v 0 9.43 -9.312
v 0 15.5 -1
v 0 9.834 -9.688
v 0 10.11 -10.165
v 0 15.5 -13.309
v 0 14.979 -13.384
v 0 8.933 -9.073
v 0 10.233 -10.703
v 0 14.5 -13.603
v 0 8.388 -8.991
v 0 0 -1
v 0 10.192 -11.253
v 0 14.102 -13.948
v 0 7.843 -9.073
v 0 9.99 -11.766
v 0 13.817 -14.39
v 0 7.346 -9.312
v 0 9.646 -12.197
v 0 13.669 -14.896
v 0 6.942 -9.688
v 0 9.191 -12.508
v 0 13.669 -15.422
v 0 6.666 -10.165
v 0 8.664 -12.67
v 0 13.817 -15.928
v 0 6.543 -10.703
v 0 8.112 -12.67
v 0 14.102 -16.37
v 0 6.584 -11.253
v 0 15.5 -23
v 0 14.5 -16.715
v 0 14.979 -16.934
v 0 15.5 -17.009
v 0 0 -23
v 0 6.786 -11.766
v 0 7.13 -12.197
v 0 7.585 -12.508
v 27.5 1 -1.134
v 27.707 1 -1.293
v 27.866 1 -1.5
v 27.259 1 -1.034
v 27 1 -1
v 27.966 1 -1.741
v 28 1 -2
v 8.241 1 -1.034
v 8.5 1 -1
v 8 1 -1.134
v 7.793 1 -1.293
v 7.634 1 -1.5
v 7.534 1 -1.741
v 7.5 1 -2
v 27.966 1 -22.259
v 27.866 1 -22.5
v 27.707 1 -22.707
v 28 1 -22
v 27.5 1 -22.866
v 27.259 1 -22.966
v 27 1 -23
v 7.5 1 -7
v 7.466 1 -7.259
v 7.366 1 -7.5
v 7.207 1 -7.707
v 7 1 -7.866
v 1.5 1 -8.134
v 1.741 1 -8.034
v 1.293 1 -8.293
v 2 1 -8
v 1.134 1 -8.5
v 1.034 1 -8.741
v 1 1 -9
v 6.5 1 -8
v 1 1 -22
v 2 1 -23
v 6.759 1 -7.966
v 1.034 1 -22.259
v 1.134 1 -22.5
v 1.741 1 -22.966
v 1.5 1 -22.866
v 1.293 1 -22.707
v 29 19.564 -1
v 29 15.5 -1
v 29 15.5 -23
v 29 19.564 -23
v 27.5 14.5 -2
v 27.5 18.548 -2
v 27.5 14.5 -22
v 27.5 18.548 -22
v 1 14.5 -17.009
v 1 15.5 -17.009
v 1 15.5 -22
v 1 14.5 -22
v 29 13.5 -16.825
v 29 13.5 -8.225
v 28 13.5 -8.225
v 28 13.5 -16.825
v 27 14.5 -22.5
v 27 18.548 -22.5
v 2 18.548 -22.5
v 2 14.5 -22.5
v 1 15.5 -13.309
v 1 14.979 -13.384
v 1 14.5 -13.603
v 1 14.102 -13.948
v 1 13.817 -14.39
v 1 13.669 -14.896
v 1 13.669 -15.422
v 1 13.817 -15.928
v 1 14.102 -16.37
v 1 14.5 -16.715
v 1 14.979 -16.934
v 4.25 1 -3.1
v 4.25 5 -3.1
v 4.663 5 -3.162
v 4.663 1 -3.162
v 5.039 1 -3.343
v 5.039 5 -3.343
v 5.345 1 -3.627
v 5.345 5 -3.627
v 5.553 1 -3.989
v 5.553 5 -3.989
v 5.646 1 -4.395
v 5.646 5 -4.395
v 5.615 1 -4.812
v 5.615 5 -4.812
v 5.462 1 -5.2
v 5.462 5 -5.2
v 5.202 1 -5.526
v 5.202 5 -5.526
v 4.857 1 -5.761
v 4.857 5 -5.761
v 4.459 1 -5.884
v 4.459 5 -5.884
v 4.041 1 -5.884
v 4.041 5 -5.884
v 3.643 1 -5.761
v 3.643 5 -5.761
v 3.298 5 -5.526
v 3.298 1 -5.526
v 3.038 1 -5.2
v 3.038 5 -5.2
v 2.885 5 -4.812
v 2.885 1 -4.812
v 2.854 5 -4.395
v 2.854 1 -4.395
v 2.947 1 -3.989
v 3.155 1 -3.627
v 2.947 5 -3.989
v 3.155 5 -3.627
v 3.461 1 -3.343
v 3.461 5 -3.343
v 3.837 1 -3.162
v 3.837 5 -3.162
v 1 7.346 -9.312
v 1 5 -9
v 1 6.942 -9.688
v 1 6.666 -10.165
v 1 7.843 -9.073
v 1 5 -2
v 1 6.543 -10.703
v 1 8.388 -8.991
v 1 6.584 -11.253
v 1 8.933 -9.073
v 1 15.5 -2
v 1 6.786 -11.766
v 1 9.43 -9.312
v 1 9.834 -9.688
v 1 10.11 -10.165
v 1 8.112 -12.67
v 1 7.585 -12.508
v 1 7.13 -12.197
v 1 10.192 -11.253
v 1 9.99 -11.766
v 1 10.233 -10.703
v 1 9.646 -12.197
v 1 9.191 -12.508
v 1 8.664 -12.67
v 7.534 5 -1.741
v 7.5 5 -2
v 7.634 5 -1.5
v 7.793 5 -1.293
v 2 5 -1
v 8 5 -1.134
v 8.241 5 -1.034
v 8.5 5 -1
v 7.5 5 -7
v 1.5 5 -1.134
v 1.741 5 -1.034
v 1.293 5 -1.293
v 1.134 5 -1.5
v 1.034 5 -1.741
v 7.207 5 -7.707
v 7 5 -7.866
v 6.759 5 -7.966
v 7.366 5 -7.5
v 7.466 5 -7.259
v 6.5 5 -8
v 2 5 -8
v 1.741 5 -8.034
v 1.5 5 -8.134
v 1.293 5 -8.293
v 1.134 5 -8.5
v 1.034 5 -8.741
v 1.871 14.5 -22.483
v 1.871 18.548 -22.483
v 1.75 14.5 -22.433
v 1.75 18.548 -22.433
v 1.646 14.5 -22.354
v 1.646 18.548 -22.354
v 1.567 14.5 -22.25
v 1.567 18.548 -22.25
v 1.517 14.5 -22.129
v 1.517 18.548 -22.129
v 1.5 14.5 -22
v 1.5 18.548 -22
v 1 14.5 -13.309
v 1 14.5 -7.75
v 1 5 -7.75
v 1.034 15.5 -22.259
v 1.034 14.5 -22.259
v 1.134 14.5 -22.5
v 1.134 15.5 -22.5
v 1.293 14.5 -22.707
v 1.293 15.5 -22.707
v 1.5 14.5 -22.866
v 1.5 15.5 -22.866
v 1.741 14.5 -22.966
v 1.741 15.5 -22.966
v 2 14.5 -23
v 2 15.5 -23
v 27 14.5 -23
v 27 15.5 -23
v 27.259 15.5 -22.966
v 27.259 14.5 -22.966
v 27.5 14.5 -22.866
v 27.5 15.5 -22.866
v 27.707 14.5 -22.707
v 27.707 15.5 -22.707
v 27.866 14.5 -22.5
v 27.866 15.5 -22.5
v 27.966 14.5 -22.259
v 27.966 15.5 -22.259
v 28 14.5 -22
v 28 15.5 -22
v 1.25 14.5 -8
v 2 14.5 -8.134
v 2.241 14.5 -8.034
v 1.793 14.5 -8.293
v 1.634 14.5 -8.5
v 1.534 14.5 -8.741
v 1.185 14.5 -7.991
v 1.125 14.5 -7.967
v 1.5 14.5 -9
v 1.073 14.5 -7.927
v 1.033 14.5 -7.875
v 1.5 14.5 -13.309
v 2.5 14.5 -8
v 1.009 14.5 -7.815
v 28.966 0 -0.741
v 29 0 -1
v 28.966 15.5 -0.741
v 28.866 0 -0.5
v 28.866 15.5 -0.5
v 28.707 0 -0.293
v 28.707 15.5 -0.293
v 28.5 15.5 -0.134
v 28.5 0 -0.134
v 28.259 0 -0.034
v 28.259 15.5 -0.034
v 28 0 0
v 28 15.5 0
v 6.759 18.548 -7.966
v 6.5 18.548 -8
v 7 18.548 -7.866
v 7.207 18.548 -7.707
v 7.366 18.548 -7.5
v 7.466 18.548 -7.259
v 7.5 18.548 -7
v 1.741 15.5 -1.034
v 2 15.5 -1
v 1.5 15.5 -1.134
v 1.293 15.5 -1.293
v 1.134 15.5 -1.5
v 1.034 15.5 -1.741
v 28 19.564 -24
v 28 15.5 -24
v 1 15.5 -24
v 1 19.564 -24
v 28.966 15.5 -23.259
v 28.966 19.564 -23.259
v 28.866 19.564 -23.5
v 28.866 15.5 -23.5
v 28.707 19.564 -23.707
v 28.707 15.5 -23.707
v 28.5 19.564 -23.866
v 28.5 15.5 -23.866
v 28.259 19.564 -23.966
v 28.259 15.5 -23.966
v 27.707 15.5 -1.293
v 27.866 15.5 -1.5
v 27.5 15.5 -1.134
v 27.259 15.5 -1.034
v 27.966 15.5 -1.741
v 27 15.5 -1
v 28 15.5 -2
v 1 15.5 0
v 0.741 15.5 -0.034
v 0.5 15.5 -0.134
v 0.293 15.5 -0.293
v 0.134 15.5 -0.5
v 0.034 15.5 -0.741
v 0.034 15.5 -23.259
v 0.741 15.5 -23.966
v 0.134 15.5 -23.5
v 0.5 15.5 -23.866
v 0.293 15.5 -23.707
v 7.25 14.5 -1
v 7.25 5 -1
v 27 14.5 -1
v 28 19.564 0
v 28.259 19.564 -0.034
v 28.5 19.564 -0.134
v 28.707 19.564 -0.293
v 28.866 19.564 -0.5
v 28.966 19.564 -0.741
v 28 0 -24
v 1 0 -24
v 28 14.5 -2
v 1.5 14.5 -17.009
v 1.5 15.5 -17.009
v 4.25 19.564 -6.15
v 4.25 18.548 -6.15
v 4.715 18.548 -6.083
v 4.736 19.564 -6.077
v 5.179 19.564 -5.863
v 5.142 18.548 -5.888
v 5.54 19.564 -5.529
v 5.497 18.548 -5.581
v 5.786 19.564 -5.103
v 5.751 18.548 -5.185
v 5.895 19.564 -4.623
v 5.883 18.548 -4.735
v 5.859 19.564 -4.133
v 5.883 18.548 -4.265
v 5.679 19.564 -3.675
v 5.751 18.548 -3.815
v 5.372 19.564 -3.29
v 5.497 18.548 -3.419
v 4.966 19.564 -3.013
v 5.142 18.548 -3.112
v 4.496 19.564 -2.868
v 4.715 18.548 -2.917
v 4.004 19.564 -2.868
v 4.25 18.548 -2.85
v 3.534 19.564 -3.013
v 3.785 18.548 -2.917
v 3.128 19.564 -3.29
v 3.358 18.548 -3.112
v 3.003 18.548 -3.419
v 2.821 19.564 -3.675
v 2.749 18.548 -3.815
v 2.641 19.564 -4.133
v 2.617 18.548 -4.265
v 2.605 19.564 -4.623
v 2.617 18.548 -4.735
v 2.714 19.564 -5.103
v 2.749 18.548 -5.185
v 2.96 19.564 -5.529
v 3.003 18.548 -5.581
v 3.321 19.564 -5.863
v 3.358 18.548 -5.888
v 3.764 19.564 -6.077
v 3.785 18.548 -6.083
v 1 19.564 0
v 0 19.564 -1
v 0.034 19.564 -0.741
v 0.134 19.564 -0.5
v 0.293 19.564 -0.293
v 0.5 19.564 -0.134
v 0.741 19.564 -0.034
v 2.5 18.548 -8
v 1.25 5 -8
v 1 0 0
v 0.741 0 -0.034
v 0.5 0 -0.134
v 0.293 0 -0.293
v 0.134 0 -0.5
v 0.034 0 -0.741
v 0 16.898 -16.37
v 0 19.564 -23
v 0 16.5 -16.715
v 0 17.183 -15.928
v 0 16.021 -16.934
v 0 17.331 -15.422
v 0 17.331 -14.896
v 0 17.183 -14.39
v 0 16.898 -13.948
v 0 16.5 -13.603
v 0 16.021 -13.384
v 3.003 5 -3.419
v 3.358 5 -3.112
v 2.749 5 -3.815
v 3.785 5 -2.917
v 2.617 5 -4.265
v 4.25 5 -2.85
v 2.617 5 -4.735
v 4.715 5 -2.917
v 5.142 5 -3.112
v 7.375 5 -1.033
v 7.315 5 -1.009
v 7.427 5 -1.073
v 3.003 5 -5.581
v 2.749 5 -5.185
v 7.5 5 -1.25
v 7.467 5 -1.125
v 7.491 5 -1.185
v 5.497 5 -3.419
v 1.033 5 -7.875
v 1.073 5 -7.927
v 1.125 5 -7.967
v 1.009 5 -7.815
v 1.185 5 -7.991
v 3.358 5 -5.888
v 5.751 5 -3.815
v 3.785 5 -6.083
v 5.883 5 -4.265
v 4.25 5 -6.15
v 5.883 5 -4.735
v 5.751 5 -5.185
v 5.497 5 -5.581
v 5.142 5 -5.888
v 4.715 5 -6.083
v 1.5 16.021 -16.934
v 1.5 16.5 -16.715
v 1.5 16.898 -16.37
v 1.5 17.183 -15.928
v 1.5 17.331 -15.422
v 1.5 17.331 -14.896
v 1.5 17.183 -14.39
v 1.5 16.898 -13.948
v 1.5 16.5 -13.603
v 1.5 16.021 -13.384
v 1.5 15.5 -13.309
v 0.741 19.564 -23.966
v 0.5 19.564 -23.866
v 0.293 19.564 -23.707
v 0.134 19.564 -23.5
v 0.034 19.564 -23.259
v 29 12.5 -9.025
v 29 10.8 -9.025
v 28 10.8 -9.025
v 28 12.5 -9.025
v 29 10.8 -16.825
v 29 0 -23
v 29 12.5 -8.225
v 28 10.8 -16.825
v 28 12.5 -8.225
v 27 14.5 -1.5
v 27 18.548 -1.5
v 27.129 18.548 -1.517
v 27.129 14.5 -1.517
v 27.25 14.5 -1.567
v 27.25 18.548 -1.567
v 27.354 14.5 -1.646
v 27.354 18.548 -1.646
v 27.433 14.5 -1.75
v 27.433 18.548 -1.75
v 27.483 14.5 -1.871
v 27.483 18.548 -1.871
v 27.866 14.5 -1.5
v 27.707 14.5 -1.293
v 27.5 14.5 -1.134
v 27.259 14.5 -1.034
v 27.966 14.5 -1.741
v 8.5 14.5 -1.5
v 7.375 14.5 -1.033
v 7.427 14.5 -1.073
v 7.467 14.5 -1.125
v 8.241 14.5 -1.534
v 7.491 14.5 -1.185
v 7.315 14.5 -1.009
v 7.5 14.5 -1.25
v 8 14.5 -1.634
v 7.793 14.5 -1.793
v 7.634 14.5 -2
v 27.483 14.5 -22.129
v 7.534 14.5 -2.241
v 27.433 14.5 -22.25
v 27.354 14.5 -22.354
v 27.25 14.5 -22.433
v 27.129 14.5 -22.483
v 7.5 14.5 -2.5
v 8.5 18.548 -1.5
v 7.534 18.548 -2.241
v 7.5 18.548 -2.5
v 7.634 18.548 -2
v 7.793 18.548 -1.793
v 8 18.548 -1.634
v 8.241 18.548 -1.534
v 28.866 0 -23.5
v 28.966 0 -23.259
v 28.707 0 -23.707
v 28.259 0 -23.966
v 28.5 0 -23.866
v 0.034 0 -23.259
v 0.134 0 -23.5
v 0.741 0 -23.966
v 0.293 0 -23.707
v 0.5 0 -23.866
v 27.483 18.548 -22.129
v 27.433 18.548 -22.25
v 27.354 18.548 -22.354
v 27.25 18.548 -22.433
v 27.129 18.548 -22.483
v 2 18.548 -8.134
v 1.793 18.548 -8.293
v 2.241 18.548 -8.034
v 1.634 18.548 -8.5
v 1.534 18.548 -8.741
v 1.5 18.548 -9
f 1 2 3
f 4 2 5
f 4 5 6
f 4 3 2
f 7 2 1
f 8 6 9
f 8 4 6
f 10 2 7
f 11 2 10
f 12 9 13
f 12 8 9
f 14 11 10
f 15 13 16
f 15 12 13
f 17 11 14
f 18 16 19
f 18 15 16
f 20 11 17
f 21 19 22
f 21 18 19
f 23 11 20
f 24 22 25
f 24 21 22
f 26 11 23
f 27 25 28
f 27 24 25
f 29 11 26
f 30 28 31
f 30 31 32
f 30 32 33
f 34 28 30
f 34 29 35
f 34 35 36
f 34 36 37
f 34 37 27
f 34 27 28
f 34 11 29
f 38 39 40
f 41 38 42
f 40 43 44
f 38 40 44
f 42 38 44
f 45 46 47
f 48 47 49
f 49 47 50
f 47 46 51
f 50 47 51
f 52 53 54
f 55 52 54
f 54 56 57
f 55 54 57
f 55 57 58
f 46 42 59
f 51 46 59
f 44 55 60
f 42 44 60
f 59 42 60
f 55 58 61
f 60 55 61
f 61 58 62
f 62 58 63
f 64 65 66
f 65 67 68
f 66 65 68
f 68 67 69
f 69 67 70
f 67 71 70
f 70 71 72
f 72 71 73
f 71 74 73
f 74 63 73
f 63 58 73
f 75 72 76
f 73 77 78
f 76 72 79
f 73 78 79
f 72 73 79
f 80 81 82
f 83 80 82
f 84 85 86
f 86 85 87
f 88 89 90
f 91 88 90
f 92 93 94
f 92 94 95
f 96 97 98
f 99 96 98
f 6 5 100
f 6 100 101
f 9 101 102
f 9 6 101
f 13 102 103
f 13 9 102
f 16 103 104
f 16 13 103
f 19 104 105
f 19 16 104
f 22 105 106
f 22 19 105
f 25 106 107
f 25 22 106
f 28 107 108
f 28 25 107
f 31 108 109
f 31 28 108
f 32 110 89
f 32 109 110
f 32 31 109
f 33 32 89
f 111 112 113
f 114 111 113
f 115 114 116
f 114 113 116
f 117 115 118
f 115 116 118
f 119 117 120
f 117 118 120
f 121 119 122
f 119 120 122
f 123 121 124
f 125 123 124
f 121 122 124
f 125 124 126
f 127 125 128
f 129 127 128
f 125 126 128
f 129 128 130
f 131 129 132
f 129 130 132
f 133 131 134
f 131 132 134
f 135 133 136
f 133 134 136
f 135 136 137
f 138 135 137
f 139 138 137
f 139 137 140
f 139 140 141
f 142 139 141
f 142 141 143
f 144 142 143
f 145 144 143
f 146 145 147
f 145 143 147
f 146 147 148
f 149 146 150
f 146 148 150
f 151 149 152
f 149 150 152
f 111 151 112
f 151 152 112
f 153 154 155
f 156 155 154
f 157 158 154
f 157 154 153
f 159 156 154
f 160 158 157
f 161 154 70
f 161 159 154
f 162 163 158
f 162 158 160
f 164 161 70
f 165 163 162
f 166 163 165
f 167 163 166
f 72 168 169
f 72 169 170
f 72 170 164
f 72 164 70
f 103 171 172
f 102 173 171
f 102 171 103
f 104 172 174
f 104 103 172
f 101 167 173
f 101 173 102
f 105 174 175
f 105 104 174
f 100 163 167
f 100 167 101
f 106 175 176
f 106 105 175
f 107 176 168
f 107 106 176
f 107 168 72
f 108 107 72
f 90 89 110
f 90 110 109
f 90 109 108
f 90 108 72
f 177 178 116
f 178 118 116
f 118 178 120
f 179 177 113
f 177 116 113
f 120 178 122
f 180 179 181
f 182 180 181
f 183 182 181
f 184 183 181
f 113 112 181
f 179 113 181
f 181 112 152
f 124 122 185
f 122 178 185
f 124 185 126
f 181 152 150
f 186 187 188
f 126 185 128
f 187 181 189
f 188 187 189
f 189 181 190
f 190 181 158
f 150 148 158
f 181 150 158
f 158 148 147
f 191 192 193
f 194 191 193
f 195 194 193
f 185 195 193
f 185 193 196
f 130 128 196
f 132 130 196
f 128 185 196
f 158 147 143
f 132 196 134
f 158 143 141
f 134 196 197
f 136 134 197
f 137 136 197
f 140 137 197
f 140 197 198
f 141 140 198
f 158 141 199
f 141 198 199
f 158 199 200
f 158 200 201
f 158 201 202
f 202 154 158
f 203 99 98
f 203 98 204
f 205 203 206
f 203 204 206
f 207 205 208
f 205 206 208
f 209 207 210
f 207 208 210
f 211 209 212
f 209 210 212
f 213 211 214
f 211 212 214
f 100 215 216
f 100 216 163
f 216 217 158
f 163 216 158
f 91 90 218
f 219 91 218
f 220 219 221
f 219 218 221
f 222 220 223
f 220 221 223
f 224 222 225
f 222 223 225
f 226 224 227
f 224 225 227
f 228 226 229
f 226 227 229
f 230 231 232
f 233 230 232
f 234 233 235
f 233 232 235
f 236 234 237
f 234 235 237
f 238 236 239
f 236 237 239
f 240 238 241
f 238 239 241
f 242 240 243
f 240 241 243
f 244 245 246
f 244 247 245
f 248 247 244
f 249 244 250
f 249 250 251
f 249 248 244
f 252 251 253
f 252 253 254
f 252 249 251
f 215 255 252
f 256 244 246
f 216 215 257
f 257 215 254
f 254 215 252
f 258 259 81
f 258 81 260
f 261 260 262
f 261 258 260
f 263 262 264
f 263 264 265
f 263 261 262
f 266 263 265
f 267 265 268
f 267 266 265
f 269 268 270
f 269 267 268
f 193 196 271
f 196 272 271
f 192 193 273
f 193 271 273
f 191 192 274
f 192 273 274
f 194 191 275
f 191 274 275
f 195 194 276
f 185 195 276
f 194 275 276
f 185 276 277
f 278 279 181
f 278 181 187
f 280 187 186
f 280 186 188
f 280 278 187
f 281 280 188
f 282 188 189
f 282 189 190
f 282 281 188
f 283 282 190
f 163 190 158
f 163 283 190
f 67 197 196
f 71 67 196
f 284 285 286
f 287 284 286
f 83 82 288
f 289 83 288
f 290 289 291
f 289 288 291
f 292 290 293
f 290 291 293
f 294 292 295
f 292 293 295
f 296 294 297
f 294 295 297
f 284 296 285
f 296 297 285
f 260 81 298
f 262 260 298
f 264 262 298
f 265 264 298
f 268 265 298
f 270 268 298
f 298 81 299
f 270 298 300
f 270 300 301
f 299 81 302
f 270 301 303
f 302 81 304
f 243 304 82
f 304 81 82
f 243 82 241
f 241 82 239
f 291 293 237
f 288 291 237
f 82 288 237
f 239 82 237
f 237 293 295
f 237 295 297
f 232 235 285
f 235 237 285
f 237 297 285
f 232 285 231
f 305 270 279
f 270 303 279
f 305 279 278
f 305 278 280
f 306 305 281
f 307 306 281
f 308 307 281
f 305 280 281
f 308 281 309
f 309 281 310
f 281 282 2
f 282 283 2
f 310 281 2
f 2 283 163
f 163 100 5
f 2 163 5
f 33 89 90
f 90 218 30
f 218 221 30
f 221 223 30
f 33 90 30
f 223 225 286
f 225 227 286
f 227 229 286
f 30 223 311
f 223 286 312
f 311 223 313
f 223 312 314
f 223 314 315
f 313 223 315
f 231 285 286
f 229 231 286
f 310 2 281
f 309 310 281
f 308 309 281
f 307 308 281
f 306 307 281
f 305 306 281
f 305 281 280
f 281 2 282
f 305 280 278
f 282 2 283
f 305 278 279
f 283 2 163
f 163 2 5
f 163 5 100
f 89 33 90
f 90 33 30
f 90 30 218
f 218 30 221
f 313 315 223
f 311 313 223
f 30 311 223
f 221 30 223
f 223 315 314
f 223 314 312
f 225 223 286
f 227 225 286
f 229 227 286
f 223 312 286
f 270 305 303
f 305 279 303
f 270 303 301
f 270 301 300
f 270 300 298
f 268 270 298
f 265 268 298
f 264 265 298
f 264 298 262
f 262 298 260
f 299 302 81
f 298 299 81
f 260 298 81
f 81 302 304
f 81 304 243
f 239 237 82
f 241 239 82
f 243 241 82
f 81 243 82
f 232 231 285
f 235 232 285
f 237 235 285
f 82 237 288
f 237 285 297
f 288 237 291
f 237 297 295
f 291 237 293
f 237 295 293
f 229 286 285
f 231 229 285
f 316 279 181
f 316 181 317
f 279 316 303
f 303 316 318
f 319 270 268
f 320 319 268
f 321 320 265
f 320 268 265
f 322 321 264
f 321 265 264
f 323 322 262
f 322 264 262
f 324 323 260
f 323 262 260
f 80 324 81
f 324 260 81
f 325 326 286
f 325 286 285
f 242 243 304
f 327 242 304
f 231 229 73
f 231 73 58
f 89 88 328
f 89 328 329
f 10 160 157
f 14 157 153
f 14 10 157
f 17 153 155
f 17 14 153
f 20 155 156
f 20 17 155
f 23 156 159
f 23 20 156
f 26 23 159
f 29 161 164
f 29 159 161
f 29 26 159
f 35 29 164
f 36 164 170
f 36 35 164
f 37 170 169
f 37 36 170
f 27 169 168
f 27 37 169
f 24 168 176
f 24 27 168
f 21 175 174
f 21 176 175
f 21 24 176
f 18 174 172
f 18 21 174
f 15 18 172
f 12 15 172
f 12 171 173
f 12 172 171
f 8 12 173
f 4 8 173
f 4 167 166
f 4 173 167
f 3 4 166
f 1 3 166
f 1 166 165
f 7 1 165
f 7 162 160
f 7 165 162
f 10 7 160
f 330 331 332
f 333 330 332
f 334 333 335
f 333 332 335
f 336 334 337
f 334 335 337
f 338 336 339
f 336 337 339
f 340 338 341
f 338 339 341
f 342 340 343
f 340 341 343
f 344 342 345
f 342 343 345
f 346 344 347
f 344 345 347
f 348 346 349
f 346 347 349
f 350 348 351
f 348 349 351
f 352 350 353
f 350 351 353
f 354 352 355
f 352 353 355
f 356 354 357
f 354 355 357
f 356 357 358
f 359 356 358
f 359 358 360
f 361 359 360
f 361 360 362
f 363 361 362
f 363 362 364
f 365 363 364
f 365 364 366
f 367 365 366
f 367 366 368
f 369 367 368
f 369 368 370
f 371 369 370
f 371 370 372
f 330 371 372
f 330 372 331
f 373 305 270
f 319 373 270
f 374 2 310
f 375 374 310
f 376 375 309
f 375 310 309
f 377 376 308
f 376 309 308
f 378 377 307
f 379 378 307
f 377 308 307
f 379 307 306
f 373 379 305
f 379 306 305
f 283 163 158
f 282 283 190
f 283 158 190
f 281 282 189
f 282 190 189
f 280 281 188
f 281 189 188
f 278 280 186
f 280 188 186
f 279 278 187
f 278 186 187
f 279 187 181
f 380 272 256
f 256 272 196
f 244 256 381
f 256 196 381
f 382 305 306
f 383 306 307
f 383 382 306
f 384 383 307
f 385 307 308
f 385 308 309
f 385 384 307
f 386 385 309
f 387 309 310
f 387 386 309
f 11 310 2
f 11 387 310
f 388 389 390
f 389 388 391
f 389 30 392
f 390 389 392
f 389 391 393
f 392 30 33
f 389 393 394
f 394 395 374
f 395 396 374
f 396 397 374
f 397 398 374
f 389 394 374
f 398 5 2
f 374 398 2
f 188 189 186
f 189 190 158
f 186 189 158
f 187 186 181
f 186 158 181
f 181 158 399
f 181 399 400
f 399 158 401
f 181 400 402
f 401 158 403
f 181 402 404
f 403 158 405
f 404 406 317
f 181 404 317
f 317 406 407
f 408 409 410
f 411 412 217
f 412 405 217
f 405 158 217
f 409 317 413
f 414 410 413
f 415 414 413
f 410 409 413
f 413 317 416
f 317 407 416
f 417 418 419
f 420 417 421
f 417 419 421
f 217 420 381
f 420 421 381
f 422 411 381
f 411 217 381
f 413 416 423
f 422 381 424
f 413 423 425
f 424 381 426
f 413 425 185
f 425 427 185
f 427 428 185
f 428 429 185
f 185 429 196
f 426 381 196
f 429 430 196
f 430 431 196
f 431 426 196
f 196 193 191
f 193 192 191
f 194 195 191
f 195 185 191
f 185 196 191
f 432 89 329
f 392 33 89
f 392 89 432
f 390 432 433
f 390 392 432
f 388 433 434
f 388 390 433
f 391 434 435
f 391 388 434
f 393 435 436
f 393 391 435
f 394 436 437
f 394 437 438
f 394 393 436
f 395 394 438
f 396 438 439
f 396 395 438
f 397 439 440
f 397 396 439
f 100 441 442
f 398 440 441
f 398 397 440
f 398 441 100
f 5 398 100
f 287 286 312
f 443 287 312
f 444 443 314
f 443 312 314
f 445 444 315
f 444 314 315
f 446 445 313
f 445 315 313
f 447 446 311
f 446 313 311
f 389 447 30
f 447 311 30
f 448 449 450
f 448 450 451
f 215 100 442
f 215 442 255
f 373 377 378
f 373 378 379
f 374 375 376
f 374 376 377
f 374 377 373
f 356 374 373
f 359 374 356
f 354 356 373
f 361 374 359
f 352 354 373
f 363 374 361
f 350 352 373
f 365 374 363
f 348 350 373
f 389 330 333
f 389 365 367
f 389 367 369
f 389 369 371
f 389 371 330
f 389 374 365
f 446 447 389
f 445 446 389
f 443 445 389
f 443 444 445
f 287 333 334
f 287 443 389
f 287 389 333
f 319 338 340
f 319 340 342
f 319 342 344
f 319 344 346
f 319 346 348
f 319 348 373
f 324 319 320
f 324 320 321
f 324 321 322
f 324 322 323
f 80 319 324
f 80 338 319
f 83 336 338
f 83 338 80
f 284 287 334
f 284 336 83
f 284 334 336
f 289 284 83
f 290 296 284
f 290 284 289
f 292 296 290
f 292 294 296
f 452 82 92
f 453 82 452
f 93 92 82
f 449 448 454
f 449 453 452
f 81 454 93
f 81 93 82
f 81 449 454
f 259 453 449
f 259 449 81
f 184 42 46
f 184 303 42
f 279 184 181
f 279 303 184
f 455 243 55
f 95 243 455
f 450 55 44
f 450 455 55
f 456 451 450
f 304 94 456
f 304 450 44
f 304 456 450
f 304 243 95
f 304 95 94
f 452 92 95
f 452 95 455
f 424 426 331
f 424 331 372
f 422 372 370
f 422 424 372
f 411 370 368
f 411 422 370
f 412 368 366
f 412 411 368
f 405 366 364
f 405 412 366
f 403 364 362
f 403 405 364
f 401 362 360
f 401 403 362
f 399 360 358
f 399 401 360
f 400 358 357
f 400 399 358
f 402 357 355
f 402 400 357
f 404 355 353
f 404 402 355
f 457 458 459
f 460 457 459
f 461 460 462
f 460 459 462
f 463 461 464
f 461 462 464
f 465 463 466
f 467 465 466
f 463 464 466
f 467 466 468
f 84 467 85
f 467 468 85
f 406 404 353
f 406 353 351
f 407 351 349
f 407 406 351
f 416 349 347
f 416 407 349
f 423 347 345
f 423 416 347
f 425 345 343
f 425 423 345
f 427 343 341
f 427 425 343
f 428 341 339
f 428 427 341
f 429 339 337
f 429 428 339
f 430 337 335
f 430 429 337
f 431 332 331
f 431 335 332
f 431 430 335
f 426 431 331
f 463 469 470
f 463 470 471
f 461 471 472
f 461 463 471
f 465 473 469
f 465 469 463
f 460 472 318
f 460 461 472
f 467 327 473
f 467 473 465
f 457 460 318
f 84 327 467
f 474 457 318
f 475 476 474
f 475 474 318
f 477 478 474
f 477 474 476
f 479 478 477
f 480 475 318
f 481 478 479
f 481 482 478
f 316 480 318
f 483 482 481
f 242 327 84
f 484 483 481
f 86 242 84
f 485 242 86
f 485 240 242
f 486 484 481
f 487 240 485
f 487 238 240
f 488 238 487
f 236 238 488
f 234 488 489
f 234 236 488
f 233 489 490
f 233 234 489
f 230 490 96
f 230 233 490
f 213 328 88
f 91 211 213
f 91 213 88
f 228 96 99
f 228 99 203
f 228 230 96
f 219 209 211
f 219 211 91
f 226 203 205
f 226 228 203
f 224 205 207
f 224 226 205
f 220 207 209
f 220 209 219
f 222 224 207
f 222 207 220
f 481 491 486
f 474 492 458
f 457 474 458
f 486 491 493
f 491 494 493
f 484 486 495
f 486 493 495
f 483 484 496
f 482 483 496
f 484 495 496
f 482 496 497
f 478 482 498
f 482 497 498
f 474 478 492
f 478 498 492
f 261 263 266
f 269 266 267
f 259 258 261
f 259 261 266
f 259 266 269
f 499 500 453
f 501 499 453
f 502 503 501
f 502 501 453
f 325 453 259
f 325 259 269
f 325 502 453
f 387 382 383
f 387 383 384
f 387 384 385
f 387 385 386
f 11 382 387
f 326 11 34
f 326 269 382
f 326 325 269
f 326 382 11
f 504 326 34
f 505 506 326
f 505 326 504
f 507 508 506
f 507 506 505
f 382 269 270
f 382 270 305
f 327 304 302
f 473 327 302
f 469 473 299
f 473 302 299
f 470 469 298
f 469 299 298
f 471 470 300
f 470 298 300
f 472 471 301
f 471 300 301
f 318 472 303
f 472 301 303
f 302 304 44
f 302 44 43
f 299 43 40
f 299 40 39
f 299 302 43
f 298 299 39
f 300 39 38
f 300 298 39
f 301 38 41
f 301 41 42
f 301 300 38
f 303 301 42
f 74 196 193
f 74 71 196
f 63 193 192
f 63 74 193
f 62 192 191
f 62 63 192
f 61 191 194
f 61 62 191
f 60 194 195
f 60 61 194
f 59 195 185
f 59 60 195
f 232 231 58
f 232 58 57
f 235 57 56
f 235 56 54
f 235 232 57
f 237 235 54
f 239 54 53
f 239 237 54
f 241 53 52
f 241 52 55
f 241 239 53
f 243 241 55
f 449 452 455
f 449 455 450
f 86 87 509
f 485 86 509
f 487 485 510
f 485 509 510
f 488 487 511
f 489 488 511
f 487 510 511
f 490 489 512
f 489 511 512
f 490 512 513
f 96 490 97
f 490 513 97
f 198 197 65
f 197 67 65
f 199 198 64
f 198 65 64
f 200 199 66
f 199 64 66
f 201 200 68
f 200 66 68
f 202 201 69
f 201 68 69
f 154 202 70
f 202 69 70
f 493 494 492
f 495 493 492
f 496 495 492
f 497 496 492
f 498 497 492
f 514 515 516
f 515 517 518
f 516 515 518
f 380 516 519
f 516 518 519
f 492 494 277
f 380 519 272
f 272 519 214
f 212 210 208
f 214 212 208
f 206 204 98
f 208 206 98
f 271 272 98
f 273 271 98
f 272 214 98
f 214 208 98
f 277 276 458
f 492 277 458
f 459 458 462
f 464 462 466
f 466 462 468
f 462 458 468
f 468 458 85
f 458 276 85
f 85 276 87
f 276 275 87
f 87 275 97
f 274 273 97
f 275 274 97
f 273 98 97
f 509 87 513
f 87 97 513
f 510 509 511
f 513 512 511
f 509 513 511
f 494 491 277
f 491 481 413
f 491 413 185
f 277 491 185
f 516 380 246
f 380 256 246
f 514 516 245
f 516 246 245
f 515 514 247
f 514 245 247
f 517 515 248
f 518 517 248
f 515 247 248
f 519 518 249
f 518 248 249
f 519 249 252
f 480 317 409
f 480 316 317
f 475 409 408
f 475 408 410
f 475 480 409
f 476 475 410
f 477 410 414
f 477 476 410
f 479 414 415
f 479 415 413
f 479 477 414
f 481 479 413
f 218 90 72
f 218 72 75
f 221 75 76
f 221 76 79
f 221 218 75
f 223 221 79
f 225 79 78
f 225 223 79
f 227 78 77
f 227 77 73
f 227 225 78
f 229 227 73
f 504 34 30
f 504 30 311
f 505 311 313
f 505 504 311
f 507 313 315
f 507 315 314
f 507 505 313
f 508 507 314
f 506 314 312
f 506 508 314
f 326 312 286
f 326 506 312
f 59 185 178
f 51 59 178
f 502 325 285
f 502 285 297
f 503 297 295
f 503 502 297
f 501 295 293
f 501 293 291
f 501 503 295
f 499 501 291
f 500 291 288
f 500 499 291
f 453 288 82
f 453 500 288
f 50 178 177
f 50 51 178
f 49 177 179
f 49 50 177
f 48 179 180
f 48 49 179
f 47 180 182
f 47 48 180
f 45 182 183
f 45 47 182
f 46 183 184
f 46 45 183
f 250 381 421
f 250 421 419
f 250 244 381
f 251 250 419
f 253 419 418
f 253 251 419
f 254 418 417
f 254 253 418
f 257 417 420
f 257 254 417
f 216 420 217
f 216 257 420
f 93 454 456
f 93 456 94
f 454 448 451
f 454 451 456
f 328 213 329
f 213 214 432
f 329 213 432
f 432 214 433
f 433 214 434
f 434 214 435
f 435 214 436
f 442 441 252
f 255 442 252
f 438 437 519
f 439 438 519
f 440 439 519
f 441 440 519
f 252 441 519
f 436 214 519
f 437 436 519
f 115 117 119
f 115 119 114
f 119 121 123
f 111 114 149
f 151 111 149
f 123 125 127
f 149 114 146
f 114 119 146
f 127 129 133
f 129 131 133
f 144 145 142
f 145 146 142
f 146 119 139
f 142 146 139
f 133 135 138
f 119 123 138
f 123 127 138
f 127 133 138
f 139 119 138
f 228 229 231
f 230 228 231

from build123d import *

# Parameters (mm, degrees)
BOSS_EXTRUDE1_DEPTH = 15.5
CUT_EXTRUDE1_DEPTH  = 14.5
CUT_EXTRUDE3_REACH  = 42.709
BOSS_EXTRUDE2_DEPTH = 4.064
CUT_EXTRUDE4_DEPTH  = 3.048
BOSS_EXTRUDE3_DEPTH = 1
SKETCH3_R           = 1.85
CUT_EXTRUDE2_DEPTH  = 1.5
CUT_EXTRUDE5_START  = 1
CUT_EXTRUDE5_DEPTH  = 0.5
BOSS_EXTRUDE4_START = 4
SKETCH6_R           = 1.4
BOSS_EXTRUDE4_DEPTH = 4
FILLET1_R           = 1
BOSS_EXTRUDE5_REACH = 42.362
SKETCH7_R           = 1.65
SKETCH8_R           = 1.65
CUT_EXTRUDE6_DEPTH  = 41.362236013
FILLET2_R           = 1
FILLET3_R           = 0.25


with BuildPart() as part:
    # Sketch1 → Boss-Extrude1 (new body)
    # profile 1 of 2: a face of its own
    with BuildSketch(Plane(origin=(0, 0, 0), x_dir=(1, 0, 0), z_dir=(0, 1, 0))):
        with BuildLine():
            ThreePointArc((1, 0), (0.292893219, 0.292893219), (0, 1))
            Line((0, 1), (0, 23))
            ThreePointArc((0, 23), (0.292893219, 23.707106781), (1, 24))
            Line((1, 24), (28, 24))
            ThreePointArc((28, 24), (28.707106781, 23.707106781), (29, 23))
            Line((29, 23), (29, 1))
            ThreePointArc((29, 1), (28.707106781, 0.292893219), (28, 0))
            Line((28, 0), (1, 0))
        make_face()
        with BuildLine():
            ThreePointArc((1, 2), (1.292893219, 1.292893219), (2, 1))
            Line((2, 1), (27, 1))
            ThreePointArc((27, 1), (27.707106781, 1.292893219), (28, 2))
            Line((28, 2), (28, 22))
            ThreePointArc((28, 22), (27.707106781, 22.707106781), (27, 23))
            Line((27, 23), (2, 23))
            ThreePointArc((2, 23), (1.292893219, 22.707106781), (1, 22))
            Line((1, 22), (1, 2))
        make_face(mode=Mode.SUBTRACT)
    # profile 2 of 2: a face of its own
    with BuildSketch(Plane(origin=(0, 0, 0), x_dir=(1, 0, 0), z_dir=(0, 1, 0))):
        with BuildLine():
            Line((1, 2), (1, 22))
            ThreePointArc((1, 22), (1.292893219, 22.707106781), (2, 23))
            Line((2, 23), (27, 23))
            ThreePointArc((27, 23), (27.707106781, 22.707106781), (28, 22))
            Line((28, 22), (28, 2))
            ThreePointArc((28, 2), (27.707106781, 1.292893219), (27, 1))
            Line((27, 1), (2, 1))
            ThreePointArc((2, 1), (1.292893219, 1.292893219), (1, 2))
        make_face()
    extrude(amount=BOSS_EXTRUDE1_DEPTH)

    # Sketch2 → Cut-Extrude1 (cut)
    with BuildSketch(Plane(origin=(0, 15.5, 0), x_dir=(1, 0, 0), z_dir=(0, 1, 0))):
        with BuildLine():
            Line((1, 2), (1, 22))
            ThreePointArc((1, 22), (1.292893219, 22.707106781), (2, 23))
            Line((2, 23), (27, 23))
            ThreePointArc((27, 23), (27.707106781, 22.707106781), (28, 22))
            Line((28, 22), (28, 2))
            ThreePointArc((28, 2), (27.707106781, 1.292893219), (27, 1))
            Line((27, 1), (2, 1))
            ThreePointArc((2, 1), (1.292893219, 1.292893219), (1, 2))
        make_face()
    extrude(amount=-CUT_EXTRUDE1_DEPTH, mode=Mode.SUBTRACT)

    # Sketch4 → Cut-Extrude3 (cut, up to next)
    with BuildSketch(Plane(origin=(29, 0, 0), x_dir=(0, 0, -1), z_dir=(1, 0, 0)), mode=Mode.PRIVATE) as cut_extrude3_sk1:
        Polygon((8.225, 13.5), (16.825, 13.5), (16.825, 10.8), (9.025, 10.8), (9.025, 12.5), (8.225, 12.5), align=None)
    cut_extrude3_tool1 = extrude(cut_extrude3_sk1.sketch, amount=-CUT_EXTRUDE3_REACH, mode=Mode.PRIVATE) & part.part
    add(cut_extrude3_tool1.solids().sort_by_distance((29, 12.181107, -12.767635))[0], mode=Mode.SUBTRACT)


with BuildPart() as body_2:
    # Sketch5 → Boss-Extrude2 (new body)
    # profile 1 of 4: a face of its own
    with BuildSketch(Plane(origin=(0, 15.5, 0), x_dir=(1, 0, 0), z_dir=(0, 1, 0))):
        with BuildLine():
            Line((0, 23), (0, 1))
            ThreePointArc((0, 1), (0.292893219, 0.292893219), (1, 0))
            Line((1, 0), (28, 0))
            ThreePointArc((28, 0), (28.707106781, 0.292893219), (29, 1))
            Line((29, 1), (29, 23))
            ThreePointArc((29, 23), (28.707106781, 23.707106781), (28, 24))
            Line((28, 24), (1, 24))
            ThreePointArc((1, 24), (0.292893219, 23.707106781), (0, 23))
        make_face()
        with BuildLine():
            Line((27, 1), (2, 1))
            ThreePointArc((2, 1), (1.292893219, 1.292893219), (1, 2))
            Line((1, 2), (1, 22))
            ThreePointArc((1, 22), (1.292893219, 22.707106781), (2, 23))
            Line((2, 23), (27, 23))
            ThreePointArc((27, 23), (27.707106781, 22.707106781), (28, 22))
            Line((28, 22), (28, 2))
            ThreePointArc((28, 2), (27.707106781, 1.292893219), (27, 1))
        make_face(mode=Mode.SUBTRACT)
    # profile 2 of 4: a face of its own
    with BuildSketch(Plane(origin=(0, 15.5, 0), x_dir=(1, 0, 0), z_dir=(0, 1, 0))):
        with BuildLine():
            ThreePointArc((2, 1), (1.292893219, 1.292893219), (1, 2))
            Line((1, 2), (1, 22))
            ThreePointArc((1, 22), (1.292893219, 22.707106781), (2, 23))
            Line((2, 23), (27, 23))
            ThreePointArc((27, 23), (27.707106781, 22.707106781), (28, 22))
            Line((28, 22), (28, 2))
            ThreePointArc((28, 2), (27.707106781, 1.292893219), (27, 1))
            Line((27, 1), (2, 1))
        make_face()
        with BuildLine():
            ThreePointArc((2, 22.5), (1.646446609, 22.353553391), (1.5, 22))
            Line((1.5, 22), (1.5, 2))
            ThreePointArc((1.5, 2), (1.646446609, 1.646446609), (2, 1.5))
            Line((2, 1.5), (27, 1.5))
            ThreePointArc((27, 1.5), (27.353553391, 1.646446609), (27.5, 2))
            Line((27.5, 2), (27.5, 22))
            ThreePointArc((27.5, 22), (27.353553391, 22.353553391), (27, 22.5))
            Line((27, 22.5), (2, 22.5))
        make_face(mode=Mode.SUBTRACT)
    # profile 3 of 4: a face of its own
    with BuildSketch(Plane(origin=(0, 15.5, 0), x_dir=(1, 0, 0), z_dir=(0, 1, 0))):
        with BuildLine():
            Line((27, 22.5), (2, 22.5))
            ThreePointArc((2, 22.5), (1.646446609, 22.353553391), (1.5, 22))
            Line((1.5, 22), (1.5, 2))
            ThreePointArc((1.5, 2), (1.646446609, 1.646446609), (2, 1.5))
            Line((2, 1.5), (27, 1.5))
            ThreePointArc((27, 1.5), (27.353553391, 1.646446609), (27.5, 2))
            Line((27.5, 2), (27.5, 22))
            ThreePointArc((27.5, 22), (27.353553391, 22.353553391), (27, 22.5))
        make_face()
    # profile 4 of 4: a face of its own
    with BuildSketch(Plane(origin=(0, 15.5, 0), x_dir=(1, 0, 0), z_dir=(0, 1, 0))):
        with BuildLine():
            Line((1, 22), (1, 2))
            ThreePointArc((1, 2), (1.292893219, 1.292893219), (2, 1))
            Line((2, 1), (27, 1))
            ThreePointArc((27, 1), (27.707106781, 1.292893219), (28, 2))
            Line((28, 2), (28, 22))
            ThreePointArc((28, 22), (27.707106781, 22.707106781), (27, 23))
            Line((27, 23), (2, 23))
            ThreePointArc((2, 23), (1.292893219, 22.707106781), (1, 22))
        make_face()
    extrude(amount=BOSS_EXTRUDE2_DEPTH)

    # Sketch5<3> → Cut-Extrude4 (cut)
    with BuildSketch(Plane(origin=(0, 15.5, 0), x_dir=(1, 0, 0), z_dir=(0, 1, 0))):
        with BuildLine():
            Line((27, 22.5), (2, 22.5))
            ThreePointArc((2, 22.5), (1.646446609, 22.353553391), (1.5, 22))
            Line((1.5, 22), (1.5, 2))
            ThreePointArc((1.5, 2), (1.646446609, 1.646446609), (2, 1.5))
            Line((2, 1.5), (27, 1.5))
            ThreePointArc((27, 1.5), (27.353553391, 1.646446609), (27.5, 2))
            Line((27.5, 2), (27.5, 22))
            ThreePointArc((27.5, 22), (27.353553391, 22.353553391), (27, 22.5))
        make_face()
    extrude(amount=CUT_EXTRUDE4_DEPTH, mode=Mode.SUBTRACT)

    # Sketch5<4> → Boss-Extrude3 (add)
    with BuildSketch(Plane(origin=(0, 15.5, 0), x_dir=(1, 0, 0), z_dir=(0, 1, 0))):
        with BuildLine():
            ThreePointArc((2, 1), (1.292893219, 1.292893219), (1, 2))
            Line((1, 2), (1, 22))
            ThreePointArc((1, 22), (1.292893219, 22.707106781), (2, 23))
            Line((2, 23), (27, 23))
            ThreePointArc((27, 23), (27.707106781, 22.707106781), (28, 22))
            Line((28, 22), (28, 2))
            ThreePointArc((28, 2), (27.707106781, 1.292893219), (27, 1))
            Line((27, 1), (2, 1))
        make_face()
        with BuildLine():
            ThreePointArc((2, 22.5), (1.646446609, 22.353553391), (1.5, 22))
            Line((1.5, 22), (1.5, 2))
            ThreePointArc((1.5, 2), (1.646446609, 1.646446609), (2, 1.5))
            Line((2, 1.5), (27, 1.5))
            ThreePointArc((27, 1.5), (27.353553391, 1.646446609), (27.5, 2))
            Line((27.5, 2), (27.5, 22))
            ThreePointArc((27.5, 22), (27.353553391, 22.353553391), (27, 22.5))
            Line((27, 22.5), (2, 22.5))
        make_face(mode=Mode.SUBTRACT)
    extrude(amount=-BOSS_EXTRUDE3_DEPTH)


with BuildPart() as cut_extrude2_tool:
    # Sketch3 → Cut-Extrude2 (new body)
    with BuildSketch(Plane(origin=(0, 0, 0), x_dir=(0, 0, -1), z_dir=(1, 0, 0))):
        with Locations((15.159, 15.5)):
            Circle(SKETCH3_R)
        with Locations(Location((10.841, 8.388, 0), (0, 0, 180))):
            Circle(SKETCH3_R)
    extrude(amount=CUT_EXTRUDE2_DEPTH)


with BuildPart() as part_1:
    add(part.part)

    # Cut-Extrude2: cut by cut_extrude2_tool
    add(cut_extrude2_tool.part, mode=Mode.SUBTRACT)

    # Sketch6 → Boss-Extrude4 (add)
    with BuildSketch(Plane(origin=(0, 1, 0), x_dir=(1, 0, 0), z_dir=(0, 1, 0)).offset(BOSS_EXTRUDE4_START)):
        with BuildLine():
            Line((1, 8), (7.5, 8))
            Line((7.5, 8), (7.5, 1))
            Line((7.5, 1), (2, 1))
            ThreePointArc((2, 1), (1.292893219, 1.292893219), (1, 2))
            Line((1, 2), (1, 8))
        make_face()
        with Locations(Location((4.25, 4.5, 0), (0, 0, 270))):
            Circle(SKETCH6_R, mode=Mode.SUBTRACT)
    extrude(amount=-BOSS_EXTRUDE4_DEPTH)

    # Fillet1
    fillet1_edges = [part_1.edges().sort_by_distance(p)[0] for p in [
        (7.5, 3, -1),
        (7.5, 3, -8),
        (1, 3, -8),
    ]]
    fillet(fillet1_edges, radius=FILLET1_R)


with BuildPart() as body_2_1:
    add(body_2.part)

    # Cut-Extrude2: cut by cut_extrude2_tool
    add(cut_extrude2_tool.part, mode=Mode.SUBTRACT)

    # Sketch3<3> → Cut-Extrude5 (cut)
    with BuildSketch(Plane(origin=(0, 0, 0), x_dir=(0, 0, -1), z_dir=(1, 0, 0)).offset(CUT_EXTRUDE5_START)):
        with BuildLine():
            Line((17.009, 13.65), (17.009, 15.5))
            ThreePointArc((17.009, 15.5), (16.467147545, 14.191852455), (15.159, 13.65))
            Line((15.159, 13.65), (17.009, 13.65))
        make_face()
        with BuildLine():
            ThreePointArc((15.159, 13.65), (13.850852455, 14.191852455), (13.309, 15.5))
            Line((13.309, 15.5), (13.309, 13.65))
            Line((13.309, 13.65), (15.159, 13.65))
        make_face()
    extrude(amount=CUT_EXTRUDE5_DEPTH, mode=Mode.SUBTRACT)

    # Sketch7 → Boss-Extrude5 (add, up to next)
    with BuildSketch(Plane(origin=(0, 5, 0), x_dir=(1, 0, 0), z_dir=(0, 1, 0)), mode=Mode.PRIVATE) as boss_extrude5_sk1:
        with BuildLine():
            Line((7.5, 8), (1, 8))
            Line((1, 8), (1, 2))
            ThreePointArc((1, 2), (1.292893219, 1.292893219), (2, 1))
            Line((2, 1), (7.5, 1))
            Line((7.5, 1), (7.5, 8))
        make_face()
        with Locations(Location((4.25, 4.5, 0), (0, 0, 270))):
            Circle(SKETCH7_R, mode=Mode.SUBTRACT)
    boss_extrude5_tool1 = extrude(boss_extrude5_sk1.sketch, amount=BOSS_EXTRUDE5_REACH, mode=Mode.PRIVATE) - body_2_1.part
    add(boss_extrude5_tool1.solids().sort_by_distance((4.25, 5, -7.904475))[0])

    # Sketch8 → Cut-Extrude6 (cut, through all)
    with BuildSketch(Plane.XZ.offset(-5)):
        with Locations(Location((4.25, -4.5, 0), (0, 0, 270))):
            Circle(SKETCH8_R)
    extrude(amount=-CUT_EXTRUDE6_DEPTH, mode=Mode.SUBTRACT)

    # Fillet2
    fillet2_edges = [body_2_1.edges().sort_by_distance(p)[0] for p in [
        (7.5, 16.524, -1.5),
        (7.5, 11.774, -8),
        (1.5, 16.524, -8),
    ]]
    fillet(fillet2_edges, radius=FILLET2_R)

    # Fillet3
    fillet3_edges = [body_2_1.edges().sort_by_distance(p)[0] for p in [
        (1, 9.75, -8),
        (7.5, 9.75, -1),
    ]]
    fillet(fillet3_edges, radius=FILLET3_R)


solid = Compound([part_1.part, body_2_1.part])
